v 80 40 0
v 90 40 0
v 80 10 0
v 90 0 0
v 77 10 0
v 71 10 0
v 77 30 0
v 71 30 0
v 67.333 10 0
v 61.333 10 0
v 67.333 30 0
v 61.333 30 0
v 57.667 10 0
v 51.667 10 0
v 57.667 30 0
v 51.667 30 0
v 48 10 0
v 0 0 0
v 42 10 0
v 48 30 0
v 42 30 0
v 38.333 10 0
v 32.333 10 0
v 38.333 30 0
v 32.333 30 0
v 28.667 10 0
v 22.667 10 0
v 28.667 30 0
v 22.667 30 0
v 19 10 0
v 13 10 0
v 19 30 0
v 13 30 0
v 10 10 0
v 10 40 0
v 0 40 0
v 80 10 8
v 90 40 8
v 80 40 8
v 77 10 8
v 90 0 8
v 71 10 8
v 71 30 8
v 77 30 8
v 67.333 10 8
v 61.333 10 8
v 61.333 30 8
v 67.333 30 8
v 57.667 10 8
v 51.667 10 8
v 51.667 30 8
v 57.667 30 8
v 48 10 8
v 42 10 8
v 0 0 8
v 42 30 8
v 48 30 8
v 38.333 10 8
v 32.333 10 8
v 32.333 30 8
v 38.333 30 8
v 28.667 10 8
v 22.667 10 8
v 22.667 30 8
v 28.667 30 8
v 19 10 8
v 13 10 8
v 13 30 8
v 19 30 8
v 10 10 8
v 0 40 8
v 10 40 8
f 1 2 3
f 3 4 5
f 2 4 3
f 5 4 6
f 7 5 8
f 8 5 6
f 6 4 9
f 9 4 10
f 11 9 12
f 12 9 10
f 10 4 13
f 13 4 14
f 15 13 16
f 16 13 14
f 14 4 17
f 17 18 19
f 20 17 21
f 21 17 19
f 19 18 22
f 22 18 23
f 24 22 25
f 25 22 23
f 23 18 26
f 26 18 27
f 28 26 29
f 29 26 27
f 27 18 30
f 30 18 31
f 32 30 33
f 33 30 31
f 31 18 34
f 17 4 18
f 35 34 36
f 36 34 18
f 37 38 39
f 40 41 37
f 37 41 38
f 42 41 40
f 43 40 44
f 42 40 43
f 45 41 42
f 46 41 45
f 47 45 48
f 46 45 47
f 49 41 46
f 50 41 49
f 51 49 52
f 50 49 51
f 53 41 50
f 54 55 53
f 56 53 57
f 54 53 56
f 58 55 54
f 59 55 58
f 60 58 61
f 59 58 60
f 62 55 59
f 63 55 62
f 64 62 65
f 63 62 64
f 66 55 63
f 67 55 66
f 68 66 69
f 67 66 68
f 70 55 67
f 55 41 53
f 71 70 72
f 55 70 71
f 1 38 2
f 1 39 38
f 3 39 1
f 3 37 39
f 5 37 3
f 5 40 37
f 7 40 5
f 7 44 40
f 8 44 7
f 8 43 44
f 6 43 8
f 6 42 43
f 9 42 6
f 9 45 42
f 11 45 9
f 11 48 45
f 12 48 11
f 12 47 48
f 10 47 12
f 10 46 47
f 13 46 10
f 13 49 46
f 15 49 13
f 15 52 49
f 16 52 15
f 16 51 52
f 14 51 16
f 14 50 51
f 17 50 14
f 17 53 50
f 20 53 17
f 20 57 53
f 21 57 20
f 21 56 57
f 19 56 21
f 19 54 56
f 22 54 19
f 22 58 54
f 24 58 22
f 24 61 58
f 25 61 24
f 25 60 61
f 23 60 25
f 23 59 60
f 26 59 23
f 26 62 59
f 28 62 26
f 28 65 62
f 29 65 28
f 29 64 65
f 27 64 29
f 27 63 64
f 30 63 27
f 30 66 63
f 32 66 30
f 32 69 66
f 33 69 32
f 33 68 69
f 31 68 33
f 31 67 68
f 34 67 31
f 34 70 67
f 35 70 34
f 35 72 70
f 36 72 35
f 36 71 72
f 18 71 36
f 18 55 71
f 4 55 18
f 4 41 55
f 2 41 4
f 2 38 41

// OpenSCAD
$fn = 32;

// ----------------------------------------------------------------------
// Guard grille: 7 slats over a 90 x 40 mm plate
// ----------------------------------------------------------------------

// --- parameters (mm) ---
profile_height = 8;       // extrusion height
profile_points = 36;      // points of the closed outline

profile = [[0, 0], [90, 0], [90, 40], [80, 40], [80, 10], [77, 10], [77, 30], [71, 30], [71, 10], [67.333, 10], [67.333, 30], [61.333, 30], [61.333, 10], [57.667, 10], [57.667, 30], [51.667, 30], [51.667, 10], [48, 10], [48, 30], [42, 30], [42, 10], [38.333, 10], [38.333, 30], [32.333, 30], [32.333, 10], [28.667, 10], [28.667, 30], [22.667, 30], [22.667, 10], [19, 10], [19, 30], [13, 30], [13, 10], [10, 10], [10, 40], [0, 40]];  // single closed polygon, 36 points, counter clockwise

// --- the one profile operation ---
linear_extrude(height = profile_height) polygon(points = profile);
